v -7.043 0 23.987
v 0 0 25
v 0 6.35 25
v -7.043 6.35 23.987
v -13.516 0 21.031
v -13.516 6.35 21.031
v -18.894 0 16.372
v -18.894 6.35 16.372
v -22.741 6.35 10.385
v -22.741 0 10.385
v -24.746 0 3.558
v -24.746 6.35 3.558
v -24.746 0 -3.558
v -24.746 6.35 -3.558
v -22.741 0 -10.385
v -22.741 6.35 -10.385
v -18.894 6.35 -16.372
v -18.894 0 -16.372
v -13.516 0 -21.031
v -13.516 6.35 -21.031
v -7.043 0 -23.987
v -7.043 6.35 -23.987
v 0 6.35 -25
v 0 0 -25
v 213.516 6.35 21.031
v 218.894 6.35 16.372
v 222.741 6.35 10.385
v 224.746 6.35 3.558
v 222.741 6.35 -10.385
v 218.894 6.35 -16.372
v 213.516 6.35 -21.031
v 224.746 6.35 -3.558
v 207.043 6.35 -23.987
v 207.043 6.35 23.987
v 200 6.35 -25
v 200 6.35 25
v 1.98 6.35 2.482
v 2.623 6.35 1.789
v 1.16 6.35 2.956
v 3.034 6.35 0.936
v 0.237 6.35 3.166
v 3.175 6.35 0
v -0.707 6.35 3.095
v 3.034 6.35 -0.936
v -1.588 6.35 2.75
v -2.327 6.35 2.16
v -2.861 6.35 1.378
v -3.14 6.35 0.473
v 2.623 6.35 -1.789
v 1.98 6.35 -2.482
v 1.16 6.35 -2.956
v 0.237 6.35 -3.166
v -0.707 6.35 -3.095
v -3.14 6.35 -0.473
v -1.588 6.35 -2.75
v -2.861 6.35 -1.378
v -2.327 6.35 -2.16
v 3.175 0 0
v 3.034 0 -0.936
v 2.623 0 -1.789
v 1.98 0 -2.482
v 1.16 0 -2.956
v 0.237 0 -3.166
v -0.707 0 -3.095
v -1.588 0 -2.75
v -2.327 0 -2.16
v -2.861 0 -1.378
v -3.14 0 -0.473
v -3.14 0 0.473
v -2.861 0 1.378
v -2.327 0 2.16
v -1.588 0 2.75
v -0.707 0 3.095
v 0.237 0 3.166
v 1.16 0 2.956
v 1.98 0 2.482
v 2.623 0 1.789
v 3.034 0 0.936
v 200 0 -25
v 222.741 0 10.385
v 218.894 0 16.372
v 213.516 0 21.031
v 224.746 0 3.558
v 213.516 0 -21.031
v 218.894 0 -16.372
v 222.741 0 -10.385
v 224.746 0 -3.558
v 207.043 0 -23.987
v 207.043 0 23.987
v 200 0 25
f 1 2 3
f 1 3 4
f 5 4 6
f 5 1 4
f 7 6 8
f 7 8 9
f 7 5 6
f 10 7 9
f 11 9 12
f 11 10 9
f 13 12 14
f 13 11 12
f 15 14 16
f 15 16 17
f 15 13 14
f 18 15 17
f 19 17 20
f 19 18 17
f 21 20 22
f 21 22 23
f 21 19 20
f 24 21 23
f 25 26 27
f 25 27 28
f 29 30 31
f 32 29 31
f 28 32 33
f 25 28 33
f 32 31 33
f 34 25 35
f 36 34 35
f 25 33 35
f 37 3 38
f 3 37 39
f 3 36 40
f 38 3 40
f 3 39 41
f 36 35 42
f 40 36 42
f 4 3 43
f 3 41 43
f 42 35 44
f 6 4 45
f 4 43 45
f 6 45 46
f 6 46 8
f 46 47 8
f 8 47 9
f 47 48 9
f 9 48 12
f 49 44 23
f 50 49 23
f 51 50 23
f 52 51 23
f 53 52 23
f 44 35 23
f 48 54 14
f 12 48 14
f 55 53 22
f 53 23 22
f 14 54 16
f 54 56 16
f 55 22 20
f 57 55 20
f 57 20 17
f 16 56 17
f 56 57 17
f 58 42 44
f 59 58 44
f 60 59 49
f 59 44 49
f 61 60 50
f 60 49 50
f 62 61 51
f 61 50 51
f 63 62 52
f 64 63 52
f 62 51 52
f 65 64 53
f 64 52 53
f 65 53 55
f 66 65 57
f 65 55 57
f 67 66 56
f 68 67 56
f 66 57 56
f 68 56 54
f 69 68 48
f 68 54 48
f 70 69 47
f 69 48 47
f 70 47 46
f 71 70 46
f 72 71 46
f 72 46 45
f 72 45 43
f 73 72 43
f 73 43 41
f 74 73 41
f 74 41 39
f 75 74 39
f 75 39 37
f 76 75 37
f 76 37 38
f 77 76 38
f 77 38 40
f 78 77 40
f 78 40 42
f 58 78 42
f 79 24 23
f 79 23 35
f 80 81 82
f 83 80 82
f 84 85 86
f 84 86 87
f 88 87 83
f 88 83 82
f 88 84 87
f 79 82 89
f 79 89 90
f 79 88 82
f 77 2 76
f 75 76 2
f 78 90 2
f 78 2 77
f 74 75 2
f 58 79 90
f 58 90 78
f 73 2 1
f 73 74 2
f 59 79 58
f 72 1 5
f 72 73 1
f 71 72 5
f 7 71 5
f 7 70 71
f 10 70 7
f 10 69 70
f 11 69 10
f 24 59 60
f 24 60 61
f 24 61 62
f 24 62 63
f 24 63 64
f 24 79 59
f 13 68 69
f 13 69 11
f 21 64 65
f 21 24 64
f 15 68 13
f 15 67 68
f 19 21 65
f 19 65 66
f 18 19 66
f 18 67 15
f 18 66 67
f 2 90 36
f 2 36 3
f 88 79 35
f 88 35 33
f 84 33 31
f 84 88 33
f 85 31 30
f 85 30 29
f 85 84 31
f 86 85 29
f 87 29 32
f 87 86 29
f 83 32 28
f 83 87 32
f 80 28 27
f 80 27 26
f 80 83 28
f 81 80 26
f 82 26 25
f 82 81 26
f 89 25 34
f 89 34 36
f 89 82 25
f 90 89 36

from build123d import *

# Parameters (mm, degrees)
BOSS_EXTRUDE1_DEPTH = 6.35
SKETCH4_R           = 3.175
CUT_EXTRUDE1_DEPTH  = 7.35


with BuildPart() as part:
    # Sketch2 → Boss-Extrude1 (new body)
    with BuildSketch(Plane(origin=(0, 0, 0), x_dir=(1, 0, 0), z_dir=(0, 1, 0))):
        with BuildLine():
            Line((0, 25), (200, 25))
            ThreePointArc((200, 25), (225, 0), (200, -25))
            Line((200, -25), (0, -25))
            ThreePointArc((0, -25), (-25, 0), (0, 25))
        make_face()
    extrude(amount=BOSS_EXTRUDE1_DEPTH)

    # Sketch4 → Cut-Extrude1 (cut, through all)
    with BuildSketch(Plane(origin=(0, 6.35, 0), x_dir=(1, 0, 0), z_dir=(0, 1, 0))):
        Circle(SKETCH4_R)
    extrude(amount=-CUT_EXTRUDE1_DEPTH, mode=Mode.SUBTRACT)


solid = part.part
